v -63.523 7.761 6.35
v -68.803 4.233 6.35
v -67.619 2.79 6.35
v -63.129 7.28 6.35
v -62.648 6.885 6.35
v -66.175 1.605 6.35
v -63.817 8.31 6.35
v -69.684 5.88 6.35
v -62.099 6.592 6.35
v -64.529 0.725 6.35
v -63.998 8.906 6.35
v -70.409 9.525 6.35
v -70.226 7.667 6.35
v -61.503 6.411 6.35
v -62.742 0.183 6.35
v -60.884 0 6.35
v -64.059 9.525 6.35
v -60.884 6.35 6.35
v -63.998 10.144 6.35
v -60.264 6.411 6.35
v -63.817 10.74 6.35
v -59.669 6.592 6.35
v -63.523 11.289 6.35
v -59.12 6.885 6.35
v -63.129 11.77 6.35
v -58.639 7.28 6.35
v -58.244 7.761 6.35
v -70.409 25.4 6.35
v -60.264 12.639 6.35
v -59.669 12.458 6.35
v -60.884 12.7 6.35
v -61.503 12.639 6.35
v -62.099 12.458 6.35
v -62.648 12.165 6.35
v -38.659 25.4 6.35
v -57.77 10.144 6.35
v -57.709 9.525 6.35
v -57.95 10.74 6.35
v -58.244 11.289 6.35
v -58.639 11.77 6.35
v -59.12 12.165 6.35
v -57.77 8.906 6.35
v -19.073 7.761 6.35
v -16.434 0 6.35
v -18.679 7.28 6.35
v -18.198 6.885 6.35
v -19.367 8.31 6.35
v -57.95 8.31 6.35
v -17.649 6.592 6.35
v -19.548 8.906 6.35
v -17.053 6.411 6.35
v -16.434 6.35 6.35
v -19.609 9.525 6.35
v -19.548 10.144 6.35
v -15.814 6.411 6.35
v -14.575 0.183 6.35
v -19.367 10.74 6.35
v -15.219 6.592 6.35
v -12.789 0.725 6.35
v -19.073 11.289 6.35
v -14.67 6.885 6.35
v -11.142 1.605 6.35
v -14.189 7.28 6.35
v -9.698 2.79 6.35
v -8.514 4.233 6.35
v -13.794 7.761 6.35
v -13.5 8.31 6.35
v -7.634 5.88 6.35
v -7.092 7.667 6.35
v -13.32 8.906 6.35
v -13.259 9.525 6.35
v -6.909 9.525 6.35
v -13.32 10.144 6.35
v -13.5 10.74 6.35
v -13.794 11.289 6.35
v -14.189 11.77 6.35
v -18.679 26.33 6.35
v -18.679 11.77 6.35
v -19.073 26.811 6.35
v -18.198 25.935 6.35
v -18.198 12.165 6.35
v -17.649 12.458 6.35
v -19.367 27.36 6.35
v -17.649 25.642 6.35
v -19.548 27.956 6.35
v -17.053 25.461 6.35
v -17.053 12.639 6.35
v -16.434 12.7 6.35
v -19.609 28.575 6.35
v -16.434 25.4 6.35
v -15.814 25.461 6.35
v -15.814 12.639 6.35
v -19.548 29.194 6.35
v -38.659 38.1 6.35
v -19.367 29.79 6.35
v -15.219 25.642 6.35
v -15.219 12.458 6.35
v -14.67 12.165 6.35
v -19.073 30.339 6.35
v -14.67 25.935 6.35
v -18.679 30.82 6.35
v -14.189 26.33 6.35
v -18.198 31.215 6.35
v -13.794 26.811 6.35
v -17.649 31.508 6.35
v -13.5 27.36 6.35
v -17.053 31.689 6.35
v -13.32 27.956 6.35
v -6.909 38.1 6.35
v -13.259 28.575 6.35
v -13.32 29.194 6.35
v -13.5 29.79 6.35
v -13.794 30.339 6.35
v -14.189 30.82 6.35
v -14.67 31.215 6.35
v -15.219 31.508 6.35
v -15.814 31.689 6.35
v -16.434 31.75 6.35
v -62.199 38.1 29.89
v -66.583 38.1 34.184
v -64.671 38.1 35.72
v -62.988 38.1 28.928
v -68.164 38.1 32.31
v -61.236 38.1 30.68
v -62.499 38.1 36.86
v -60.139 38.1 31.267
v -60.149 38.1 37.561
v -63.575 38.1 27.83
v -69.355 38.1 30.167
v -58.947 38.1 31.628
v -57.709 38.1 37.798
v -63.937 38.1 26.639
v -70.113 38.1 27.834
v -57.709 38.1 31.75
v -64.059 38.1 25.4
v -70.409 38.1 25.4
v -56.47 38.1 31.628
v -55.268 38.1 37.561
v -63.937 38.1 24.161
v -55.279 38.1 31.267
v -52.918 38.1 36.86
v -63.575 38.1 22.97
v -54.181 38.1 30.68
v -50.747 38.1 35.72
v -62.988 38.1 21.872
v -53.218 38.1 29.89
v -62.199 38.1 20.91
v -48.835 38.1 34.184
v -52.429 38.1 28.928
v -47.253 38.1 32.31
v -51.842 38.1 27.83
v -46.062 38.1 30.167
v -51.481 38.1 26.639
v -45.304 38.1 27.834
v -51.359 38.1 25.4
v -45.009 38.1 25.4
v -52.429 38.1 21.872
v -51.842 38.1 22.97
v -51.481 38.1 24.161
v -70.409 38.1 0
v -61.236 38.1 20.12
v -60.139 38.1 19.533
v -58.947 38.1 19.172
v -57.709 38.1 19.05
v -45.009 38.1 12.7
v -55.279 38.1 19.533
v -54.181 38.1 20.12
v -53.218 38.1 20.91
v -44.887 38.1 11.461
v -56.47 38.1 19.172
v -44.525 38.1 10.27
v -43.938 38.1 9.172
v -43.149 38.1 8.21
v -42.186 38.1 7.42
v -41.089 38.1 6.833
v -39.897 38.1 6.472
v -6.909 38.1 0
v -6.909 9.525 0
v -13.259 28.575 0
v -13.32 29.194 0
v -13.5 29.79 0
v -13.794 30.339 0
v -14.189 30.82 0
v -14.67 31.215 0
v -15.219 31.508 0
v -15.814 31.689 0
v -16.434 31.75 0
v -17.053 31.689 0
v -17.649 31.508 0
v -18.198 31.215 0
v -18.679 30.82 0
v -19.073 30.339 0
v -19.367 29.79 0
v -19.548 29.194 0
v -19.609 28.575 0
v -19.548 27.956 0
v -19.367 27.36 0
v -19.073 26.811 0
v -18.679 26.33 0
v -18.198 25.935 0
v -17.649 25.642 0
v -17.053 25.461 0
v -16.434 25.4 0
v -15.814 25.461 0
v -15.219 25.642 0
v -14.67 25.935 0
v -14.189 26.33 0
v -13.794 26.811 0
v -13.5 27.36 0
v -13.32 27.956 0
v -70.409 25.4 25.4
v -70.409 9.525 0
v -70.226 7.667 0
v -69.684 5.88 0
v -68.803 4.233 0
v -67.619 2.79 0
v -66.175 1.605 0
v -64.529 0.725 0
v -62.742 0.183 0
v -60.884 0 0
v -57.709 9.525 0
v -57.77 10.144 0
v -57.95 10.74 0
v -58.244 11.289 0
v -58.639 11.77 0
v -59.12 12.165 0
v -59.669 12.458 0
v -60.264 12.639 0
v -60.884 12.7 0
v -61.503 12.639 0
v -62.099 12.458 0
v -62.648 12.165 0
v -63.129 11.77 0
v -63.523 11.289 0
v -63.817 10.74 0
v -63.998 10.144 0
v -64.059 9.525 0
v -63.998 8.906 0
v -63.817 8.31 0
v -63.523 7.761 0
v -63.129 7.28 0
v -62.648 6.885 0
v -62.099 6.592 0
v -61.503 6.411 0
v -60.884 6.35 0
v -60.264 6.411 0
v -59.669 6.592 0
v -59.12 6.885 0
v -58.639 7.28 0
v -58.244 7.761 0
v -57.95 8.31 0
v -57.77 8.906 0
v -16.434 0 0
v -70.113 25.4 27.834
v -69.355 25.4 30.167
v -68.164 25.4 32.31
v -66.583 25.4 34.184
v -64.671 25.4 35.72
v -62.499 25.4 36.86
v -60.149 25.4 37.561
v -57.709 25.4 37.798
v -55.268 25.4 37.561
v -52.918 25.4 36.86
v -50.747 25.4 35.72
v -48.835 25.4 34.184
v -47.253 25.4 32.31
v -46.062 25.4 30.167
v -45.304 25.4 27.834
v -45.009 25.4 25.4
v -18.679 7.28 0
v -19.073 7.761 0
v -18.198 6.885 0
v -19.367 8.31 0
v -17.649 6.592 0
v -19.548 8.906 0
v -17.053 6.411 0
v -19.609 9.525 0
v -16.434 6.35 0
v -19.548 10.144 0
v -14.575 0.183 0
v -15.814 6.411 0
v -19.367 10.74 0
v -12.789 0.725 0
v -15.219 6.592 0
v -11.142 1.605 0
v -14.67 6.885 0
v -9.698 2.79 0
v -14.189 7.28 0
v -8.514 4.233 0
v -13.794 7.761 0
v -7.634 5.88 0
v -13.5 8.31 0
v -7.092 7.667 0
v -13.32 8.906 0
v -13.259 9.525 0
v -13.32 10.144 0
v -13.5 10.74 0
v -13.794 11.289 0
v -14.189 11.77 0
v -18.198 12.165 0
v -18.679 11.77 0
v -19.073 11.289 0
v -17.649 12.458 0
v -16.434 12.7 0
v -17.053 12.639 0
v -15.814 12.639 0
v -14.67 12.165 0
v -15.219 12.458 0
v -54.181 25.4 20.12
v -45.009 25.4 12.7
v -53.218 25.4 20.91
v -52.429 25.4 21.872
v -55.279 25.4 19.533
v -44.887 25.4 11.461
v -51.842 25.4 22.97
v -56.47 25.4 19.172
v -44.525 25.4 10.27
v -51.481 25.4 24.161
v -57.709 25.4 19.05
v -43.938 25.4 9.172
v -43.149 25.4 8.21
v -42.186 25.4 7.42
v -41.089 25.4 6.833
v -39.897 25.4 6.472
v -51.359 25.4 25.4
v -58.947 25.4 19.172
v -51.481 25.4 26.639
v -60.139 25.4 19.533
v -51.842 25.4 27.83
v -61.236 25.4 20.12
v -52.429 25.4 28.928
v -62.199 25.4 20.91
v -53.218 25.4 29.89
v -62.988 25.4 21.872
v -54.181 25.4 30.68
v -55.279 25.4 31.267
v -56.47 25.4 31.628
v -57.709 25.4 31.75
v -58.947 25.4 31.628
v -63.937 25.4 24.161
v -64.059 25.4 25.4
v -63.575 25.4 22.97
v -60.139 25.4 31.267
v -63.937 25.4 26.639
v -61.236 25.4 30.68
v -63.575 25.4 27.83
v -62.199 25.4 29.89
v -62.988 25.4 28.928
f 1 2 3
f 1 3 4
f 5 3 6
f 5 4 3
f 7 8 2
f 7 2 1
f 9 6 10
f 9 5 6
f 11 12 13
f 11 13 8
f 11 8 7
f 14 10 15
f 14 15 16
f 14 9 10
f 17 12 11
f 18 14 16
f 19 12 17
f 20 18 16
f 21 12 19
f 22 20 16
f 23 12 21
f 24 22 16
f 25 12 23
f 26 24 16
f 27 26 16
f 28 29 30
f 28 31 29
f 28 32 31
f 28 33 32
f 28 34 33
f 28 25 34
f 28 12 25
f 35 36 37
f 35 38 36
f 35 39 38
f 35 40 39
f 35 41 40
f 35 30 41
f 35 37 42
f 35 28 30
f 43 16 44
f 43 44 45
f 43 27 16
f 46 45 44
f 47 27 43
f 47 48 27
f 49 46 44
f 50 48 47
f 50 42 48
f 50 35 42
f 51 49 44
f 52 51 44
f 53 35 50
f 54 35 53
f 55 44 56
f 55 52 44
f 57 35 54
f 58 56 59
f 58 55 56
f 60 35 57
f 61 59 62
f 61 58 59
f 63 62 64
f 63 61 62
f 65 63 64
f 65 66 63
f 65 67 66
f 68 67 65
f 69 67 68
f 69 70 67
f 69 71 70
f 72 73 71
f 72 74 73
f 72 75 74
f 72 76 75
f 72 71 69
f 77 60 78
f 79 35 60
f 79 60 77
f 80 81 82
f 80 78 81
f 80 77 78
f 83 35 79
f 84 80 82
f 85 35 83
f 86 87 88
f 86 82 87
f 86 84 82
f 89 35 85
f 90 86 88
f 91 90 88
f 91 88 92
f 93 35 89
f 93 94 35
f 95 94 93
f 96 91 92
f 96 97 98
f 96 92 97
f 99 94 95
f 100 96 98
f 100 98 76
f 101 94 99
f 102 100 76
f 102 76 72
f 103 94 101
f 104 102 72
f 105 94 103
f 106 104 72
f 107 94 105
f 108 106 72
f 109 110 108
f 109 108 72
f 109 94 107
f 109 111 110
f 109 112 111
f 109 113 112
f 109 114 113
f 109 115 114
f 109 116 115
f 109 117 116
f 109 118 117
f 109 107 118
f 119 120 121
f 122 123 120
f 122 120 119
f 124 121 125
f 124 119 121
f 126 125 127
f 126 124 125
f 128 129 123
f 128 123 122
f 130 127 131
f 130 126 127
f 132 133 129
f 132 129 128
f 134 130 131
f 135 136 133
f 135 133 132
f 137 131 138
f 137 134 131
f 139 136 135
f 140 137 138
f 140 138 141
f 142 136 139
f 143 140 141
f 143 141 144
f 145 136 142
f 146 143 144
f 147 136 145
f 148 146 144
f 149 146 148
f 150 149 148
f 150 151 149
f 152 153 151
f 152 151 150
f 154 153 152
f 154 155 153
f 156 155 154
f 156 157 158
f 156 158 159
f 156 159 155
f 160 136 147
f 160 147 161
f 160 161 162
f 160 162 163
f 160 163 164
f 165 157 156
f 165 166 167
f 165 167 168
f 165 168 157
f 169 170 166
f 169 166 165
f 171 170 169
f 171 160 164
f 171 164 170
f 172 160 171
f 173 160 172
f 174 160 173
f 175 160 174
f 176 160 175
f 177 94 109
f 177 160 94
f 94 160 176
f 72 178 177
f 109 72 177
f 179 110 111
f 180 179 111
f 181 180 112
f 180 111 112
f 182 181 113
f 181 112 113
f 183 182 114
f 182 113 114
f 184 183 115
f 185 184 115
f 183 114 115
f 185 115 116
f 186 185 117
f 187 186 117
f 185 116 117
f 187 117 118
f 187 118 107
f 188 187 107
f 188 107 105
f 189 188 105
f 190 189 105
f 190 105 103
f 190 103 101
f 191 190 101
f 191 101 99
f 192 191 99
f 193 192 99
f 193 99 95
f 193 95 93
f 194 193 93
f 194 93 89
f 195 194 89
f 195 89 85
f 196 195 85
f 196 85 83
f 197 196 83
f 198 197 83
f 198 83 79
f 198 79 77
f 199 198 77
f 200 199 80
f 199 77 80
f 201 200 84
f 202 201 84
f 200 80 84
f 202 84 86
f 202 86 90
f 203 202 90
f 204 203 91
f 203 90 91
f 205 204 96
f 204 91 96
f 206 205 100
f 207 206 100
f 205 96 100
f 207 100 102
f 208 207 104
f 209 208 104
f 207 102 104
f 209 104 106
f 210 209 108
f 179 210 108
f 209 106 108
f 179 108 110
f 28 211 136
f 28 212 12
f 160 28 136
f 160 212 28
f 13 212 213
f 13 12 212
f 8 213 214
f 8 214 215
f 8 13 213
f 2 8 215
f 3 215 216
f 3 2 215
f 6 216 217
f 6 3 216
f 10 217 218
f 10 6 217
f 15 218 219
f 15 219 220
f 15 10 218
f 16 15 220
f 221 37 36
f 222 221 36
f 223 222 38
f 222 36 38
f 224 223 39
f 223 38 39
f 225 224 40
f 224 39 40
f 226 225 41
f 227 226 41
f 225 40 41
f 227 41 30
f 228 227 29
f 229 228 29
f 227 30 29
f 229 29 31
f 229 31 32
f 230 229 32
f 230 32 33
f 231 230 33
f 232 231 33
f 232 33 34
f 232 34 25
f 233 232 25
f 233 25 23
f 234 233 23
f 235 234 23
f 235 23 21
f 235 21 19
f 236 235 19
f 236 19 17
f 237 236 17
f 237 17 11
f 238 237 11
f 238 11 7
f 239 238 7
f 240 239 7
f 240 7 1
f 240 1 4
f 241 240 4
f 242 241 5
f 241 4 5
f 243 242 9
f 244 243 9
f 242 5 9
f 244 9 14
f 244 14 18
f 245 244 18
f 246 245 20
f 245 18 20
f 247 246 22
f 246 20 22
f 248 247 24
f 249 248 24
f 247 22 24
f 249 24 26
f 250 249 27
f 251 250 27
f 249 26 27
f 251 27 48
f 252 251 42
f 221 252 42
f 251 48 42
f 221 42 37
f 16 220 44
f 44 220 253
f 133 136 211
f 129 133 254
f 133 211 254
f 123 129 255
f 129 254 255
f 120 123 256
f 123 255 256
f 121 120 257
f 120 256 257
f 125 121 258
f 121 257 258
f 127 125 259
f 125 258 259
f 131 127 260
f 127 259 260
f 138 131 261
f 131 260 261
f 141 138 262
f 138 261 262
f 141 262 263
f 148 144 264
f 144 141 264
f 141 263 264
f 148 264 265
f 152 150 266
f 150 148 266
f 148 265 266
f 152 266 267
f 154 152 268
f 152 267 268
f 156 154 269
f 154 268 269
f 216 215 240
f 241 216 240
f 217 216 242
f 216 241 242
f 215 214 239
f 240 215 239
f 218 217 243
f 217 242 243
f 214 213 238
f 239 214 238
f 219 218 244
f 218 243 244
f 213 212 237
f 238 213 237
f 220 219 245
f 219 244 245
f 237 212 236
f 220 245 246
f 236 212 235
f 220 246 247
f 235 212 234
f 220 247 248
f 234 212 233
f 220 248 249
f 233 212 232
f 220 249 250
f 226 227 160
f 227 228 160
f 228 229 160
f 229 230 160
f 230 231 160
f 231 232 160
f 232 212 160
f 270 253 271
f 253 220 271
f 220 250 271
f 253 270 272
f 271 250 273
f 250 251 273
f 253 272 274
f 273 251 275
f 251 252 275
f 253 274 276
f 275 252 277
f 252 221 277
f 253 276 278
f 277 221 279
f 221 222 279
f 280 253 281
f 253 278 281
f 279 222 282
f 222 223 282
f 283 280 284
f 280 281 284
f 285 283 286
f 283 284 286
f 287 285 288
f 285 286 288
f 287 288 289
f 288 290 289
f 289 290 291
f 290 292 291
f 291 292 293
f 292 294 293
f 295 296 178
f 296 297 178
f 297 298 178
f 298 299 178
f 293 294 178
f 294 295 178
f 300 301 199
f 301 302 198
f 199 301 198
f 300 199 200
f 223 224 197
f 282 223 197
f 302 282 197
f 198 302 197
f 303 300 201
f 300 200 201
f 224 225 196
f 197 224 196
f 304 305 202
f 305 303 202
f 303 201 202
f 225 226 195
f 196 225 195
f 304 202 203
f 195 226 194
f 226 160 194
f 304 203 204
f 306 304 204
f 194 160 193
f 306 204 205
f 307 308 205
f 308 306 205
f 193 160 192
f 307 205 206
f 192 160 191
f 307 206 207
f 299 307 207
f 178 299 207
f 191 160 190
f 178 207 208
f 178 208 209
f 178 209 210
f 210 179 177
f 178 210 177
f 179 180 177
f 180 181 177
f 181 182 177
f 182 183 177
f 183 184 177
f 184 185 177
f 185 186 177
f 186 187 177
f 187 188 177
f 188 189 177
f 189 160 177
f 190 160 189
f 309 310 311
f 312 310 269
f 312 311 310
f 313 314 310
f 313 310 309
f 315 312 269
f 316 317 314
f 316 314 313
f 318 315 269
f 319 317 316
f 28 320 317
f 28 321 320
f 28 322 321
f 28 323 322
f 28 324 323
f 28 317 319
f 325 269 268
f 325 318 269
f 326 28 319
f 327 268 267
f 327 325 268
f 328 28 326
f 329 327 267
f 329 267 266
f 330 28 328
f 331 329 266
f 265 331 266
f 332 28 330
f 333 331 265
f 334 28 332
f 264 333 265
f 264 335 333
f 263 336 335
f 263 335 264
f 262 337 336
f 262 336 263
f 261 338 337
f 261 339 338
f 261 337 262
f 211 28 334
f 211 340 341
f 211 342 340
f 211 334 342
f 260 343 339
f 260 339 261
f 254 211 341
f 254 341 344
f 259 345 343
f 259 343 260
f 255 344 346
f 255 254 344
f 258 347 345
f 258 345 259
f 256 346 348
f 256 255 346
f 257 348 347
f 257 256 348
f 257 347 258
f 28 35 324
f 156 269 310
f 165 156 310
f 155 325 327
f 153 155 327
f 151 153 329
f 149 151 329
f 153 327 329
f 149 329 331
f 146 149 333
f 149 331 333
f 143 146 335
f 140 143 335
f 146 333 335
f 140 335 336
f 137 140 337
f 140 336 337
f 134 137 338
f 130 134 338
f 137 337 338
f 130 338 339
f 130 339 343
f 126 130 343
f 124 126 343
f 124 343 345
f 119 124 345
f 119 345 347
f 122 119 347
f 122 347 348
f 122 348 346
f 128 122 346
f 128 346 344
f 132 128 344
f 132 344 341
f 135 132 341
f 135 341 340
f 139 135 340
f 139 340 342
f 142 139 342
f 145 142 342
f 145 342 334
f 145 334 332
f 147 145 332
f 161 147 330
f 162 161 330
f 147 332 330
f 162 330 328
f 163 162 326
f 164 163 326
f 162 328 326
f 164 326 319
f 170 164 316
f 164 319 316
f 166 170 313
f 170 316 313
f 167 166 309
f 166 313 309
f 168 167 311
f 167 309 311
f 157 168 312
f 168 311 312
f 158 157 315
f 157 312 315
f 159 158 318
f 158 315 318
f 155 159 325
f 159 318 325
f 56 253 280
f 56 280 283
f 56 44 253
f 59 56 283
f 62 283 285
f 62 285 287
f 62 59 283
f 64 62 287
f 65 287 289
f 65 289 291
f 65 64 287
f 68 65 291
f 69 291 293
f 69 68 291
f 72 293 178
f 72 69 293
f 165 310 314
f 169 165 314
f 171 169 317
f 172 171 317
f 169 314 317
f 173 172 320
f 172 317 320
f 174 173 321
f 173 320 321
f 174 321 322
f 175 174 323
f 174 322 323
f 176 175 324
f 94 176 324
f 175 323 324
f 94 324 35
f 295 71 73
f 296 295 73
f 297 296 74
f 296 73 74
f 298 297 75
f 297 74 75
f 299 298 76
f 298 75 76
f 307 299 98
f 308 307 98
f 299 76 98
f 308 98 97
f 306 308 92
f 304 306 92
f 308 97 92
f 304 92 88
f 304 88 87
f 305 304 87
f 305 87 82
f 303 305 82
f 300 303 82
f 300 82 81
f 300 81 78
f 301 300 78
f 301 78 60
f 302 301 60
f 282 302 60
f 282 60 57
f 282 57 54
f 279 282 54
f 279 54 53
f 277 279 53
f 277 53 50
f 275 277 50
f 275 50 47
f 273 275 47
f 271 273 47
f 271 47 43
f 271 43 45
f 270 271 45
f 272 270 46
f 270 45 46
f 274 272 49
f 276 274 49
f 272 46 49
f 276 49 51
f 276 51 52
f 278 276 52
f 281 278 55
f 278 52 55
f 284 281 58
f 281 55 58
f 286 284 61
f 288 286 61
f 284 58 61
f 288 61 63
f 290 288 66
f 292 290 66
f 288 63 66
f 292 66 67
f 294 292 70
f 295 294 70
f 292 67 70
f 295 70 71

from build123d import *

# Parameters (mm, degrees)
F0_W      = 63.5
F0_H      = 38.1
F1_DEPTH  = 6.35
F2_R      = 3.175
F3_DEPTH  = 25.4
F4_W      = 25.4
F4_H      = 12.7
F5_DEPTH  = 31.75
F6_R      = 6.35
F7_DEPTH  = 25.4
F8_R      = 9.525
F9_W      = 12.7
F9_H      = 12.7
F10_DEPTH = 12.7
F12_DEPTH = 25.4


with BuildPart() as f1:
    # F0 (on Top) → F1 (new body)
    with BuildSketch(Plane.XY):
        with Locations((-38.658564874, 19.05)):
            Rectangle(F0_W, F0_H)
    extrude(amount=F1_DEPTH)

    # F2 (on face) → F3 (cut)
    with BuildSketch(Plane.XY.offset(6.35)):
        with Locations((-16.433564874, 28.575)):
            Circle(F2_R)
        with Locations((-16.433564874, 9.525)):
            Circle(F2_R)
        with Locations((-60.883564874, 9.525)):
            Circle(F2_R)
    extrude(amount=-F3_DEPTH, mode=Mode.SUBTRACT)

    # F4 (on face) → F5 (join)
    with BuildSketch(Plane.XY.offset(6.35)):
        with Locations((-57.708564874, 31.75)):
            Rectangle(F4_W, F4_H)
    extrude(amount=F5_DEPTH)

    # F6 (on face) → F7 (cut)
    with BuildSketch(Plane.XZ.offset(-25.4)):
        with Locations((-57.708564874, 25.4)):
            Circle(F6_R)
        with BuildLine():
            ThreePointArc((-70.408564874, 25.4), (-57.708564874, 37.7975720317), (-45.008564874, 25.4))
            Line((-45.008564874, 25.4), (-45.008564874, 38.1))
            Line((-45.008564874, 38.1), (-70.408564874, 38.1))
            Line((-70.408564874, 38.1), (-70.408564874, 25.4))
        make_face()
    extrude(amount=-F7_DEPTH, mode=Mode.SUBTRACT)

    # F8
    f8_edges = [f1.edges().sort_by_distance(p)[0] for p in [
        (-6.908565, 0, 3.175),
        (-70.408565, 0, 3.175),
    ]]
    fillet(f8_edges, radius=F8_R)

    # F9 (on face) → F10 (join)
    with BuildSketch(Plane.YZ.offset(-45.008564874)):
        with Locations((31.75, 12.7)):
            Rectangle(F9_W, F9_H)
    extrude(amount=F10_DEPTH)

    # F11 (on face) → F12 (cut)
    with BuildSketch(Plane.XZ.offset(-25.4)):
        with BuildLine():
            Line((-32.308564874, 19.05), (-38.658564874, 19.05))
            ThreePointArc((-38.658564874, 19.05), (-34.1684368135, 17.1901280605), (-32.308564874, 12.7))
            Line((-32.308564874, 12.7), (-32.308564874, 19.05))
        make_face()
        with BuildLine():
            Line((-38.658564874, 19.05), (-45.008564874, 19.05))
            Line((-45.008564874, 19.05), (-45.008564874, 12.7))
            ThreePointArc((-45.008564874, 12.7), (-43.1486929345, 17.1901280605), (-38.658564874, 19.05))
        make_face()
        with BuildLine():
            ThreePointArc((-32.308564874, 12.7), (-34.1684368135, 8.2098719395), (-38.658564874, 6.35))
            Line((-38.658564874, 6.35), (-32.308564874, 6.35))
            Line((-32.308564874, 6.35), (-32.308564874, 12.7))
        make_face()
        with BuildLine():
            ThreePointArc((-38.658564874, 19.05), (-43.1486929345, 17.1901280605), (-45.008564874, 12.7))
            ThreePointArc((-45.008564874, 12.7), (-43.1486929345, 8.2098719395), (-38.658564874, 6.35))
            ThreePointArc((-38.658564874, 6.35), (-34.1684368135, 8.2098719395), (-32.308564874, 12.7))
            ThreePointArc((-32.308564874, 12.7), (-34.1684368135, 17.1901280605), (-38.658564874, 19.05))
        make_face()
    extrude(amount=-F12_DEPTH, mode=Mode.SUBTRACT)


solid = f1.part
